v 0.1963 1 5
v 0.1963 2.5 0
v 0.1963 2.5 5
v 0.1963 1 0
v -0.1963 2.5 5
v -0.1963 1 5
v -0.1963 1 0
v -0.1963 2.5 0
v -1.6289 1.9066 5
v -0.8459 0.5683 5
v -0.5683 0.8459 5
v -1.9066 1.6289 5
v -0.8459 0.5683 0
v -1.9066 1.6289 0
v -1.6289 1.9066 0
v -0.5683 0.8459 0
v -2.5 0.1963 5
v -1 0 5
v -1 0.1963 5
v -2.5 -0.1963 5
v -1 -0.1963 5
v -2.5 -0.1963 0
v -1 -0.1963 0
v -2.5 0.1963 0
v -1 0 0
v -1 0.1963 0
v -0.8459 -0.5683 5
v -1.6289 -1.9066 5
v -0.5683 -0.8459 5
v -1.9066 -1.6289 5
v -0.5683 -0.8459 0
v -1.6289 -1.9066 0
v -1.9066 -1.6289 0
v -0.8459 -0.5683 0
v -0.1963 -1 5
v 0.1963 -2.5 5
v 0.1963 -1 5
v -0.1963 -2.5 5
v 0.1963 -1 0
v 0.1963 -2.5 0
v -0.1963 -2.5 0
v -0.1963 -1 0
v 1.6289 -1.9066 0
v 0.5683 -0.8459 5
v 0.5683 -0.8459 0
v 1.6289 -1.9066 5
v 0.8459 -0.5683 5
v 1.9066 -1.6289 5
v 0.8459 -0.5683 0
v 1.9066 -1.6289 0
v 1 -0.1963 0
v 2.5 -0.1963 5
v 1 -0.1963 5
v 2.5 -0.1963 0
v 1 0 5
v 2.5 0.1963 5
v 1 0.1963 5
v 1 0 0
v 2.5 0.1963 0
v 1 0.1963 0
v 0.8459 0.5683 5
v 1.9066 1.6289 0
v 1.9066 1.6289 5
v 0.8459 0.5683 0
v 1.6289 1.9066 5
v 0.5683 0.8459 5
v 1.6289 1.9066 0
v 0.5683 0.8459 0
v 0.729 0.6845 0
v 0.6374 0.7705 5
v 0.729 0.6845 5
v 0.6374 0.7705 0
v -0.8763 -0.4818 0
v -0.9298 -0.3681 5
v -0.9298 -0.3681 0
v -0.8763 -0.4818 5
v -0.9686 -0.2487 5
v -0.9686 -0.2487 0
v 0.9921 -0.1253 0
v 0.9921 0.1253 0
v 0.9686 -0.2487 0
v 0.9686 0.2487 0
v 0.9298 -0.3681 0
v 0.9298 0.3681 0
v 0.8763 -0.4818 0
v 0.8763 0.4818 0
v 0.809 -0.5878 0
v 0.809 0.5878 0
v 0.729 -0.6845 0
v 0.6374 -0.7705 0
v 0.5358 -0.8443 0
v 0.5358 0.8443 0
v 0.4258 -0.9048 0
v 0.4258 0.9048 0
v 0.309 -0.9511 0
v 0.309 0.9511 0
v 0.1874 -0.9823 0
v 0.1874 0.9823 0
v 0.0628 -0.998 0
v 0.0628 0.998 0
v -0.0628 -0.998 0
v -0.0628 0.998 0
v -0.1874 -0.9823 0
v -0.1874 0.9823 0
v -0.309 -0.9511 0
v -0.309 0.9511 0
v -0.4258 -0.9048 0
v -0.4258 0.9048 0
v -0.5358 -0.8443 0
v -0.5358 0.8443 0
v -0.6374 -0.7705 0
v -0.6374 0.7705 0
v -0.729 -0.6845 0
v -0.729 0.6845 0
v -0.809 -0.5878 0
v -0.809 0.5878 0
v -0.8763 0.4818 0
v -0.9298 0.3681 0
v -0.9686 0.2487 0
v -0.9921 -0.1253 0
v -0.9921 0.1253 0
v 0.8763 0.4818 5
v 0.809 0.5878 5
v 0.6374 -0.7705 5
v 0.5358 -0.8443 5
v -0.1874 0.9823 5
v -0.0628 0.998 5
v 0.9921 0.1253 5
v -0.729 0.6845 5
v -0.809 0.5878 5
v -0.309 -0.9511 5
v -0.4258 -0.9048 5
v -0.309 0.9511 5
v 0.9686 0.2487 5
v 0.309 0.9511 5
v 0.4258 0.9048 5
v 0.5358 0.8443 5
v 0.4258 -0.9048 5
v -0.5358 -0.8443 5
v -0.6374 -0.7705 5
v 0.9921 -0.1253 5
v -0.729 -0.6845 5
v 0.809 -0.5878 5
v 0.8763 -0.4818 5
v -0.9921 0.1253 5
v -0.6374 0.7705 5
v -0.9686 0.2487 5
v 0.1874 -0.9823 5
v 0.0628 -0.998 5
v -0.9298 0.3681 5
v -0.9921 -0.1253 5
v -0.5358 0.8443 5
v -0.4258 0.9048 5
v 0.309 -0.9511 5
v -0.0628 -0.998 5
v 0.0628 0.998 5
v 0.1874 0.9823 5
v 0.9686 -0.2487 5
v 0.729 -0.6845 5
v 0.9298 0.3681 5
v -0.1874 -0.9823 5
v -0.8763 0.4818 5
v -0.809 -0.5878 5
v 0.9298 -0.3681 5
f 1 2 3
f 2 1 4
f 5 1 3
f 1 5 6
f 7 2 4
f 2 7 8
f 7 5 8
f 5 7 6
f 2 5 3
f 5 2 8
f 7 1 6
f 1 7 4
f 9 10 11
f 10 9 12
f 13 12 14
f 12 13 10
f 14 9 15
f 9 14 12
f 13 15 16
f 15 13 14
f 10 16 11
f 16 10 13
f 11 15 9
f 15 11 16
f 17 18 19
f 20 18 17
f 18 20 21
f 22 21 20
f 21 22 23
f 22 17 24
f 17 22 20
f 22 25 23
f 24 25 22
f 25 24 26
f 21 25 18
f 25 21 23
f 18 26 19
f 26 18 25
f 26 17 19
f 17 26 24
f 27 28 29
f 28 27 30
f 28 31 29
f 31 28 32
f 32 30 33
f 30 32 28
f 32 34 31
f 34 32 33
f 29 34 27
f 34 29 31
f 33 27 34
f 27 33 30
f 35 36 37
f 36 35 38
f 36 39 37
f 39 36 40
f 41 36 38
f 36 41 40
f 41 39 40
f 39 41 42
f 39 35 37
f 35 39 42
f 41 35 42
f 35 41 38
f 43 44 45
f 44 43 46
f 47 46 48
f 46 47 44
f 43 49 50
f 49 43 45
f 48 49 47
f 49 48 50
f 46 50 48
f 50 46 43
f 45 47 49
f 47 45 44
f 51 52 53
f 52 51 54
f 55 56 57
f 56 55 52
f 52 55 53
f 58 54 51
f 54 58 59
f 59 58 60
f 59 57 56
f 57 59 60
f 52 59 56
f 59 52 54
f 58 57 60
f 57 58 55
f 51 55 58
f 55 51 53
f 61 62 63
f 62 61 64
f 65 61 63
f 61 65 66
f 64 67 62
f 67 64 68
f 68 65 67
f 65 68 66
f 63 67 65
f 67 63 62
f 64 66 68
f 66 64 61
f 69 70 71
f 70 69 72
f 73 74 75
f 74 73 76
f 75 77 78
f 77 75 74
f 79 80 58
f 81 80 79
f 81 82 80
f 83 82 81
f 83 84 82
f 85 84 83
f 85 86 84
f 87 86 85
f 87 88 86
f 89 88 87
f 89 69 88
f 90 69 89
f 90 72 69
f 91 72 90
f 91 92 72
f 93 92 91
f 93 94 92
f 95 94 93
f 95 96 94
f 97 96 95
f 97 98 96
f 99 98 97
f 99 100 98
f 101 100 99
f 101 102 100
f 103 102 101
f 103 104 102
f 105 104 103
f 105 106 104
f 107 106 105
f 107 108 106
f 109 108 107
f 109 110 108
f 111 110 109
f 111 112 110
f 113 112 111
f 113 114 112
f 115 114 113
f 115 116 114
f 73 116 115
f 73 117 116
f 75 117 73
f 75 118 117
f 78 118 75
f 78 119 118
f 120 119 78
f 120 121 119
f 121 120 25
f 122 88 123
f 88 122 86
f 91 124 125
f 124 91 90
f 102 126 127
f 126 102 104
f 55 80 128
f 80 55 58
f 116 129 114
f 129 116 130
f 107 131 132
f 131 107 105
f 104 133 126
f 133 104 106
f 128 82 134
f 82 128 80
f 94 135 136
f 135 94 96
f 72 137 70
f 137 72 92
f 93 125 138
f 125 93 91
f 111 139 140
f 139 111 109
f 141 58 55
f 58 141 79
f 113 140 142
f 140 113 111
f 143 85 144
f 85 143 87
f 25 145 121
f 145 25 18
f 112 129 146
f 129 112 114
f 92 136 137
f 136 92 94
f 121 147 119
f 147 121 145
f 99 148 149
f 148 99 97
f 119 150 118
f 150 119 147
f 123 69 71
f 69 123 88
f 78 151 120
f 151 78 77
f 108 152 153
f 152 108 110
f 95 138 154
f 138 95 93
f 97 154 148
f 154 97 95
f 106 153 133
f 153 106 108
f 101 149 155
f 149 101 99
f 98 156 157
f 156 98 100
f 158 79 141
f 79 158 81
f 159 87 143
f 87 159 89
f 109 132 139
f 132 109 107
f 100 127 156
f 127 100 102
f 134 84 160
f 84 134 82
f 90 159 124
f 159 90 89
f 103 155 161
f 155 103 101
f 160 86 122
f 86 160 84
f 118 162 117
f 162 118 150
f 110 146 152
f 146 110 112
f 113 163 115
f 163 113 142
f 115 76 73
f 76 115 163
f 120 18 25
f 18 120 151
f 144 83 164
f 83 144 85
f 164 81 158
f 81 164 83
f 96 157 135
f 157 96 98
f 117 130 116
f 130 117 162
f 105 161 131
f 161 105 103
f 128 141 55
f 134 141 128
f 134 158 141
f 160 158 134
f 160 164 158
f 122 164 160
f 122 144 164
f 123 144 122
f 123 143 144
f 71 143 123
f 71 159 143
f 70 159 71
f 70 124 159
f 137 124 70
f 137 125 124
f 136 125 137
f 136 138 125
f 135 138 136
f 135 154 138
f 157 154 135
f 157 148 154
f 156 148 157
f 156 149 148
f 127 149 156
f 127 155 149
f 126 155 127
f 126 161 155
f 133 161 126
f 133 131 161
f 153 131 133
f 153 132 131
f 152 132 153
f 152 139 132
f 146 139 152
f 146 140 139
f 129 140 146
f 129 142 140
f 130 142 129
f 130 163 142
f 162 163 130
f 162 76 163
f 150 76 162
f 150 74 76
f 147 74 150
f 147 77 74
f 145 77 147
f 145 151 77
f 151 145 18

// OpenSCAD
/** Created by Jose Araujo. 2014-06-06
	Simple gear (like the ones coming in hobby
	metal motors.
*/

shaft= 1;  // center shaft radio
h = 5; // lenght of shaft
gr = 2.5 ; //gear radio
nt = 8; //number of tooth. 
td = 1; //teeth depth.
pi = 3.1415926535897932384626433;
c = 2*pi *shaft; // circumference of shaft

cylinder ( h= h, r= shaft , $fn= 50 );

for ( i= [0: (nt -1)] ){	
	//a = i * 360/nt; 

	//translate ( [-sin( a)* shaft,cos(a) *shaft,0])
	rotate( [0,0, i*360/nt]) 
	translate ( [-c/(nt*2)/2, shaft,0])
	cube (size=[c/(nt*2),gr-shaft, h]);
}
